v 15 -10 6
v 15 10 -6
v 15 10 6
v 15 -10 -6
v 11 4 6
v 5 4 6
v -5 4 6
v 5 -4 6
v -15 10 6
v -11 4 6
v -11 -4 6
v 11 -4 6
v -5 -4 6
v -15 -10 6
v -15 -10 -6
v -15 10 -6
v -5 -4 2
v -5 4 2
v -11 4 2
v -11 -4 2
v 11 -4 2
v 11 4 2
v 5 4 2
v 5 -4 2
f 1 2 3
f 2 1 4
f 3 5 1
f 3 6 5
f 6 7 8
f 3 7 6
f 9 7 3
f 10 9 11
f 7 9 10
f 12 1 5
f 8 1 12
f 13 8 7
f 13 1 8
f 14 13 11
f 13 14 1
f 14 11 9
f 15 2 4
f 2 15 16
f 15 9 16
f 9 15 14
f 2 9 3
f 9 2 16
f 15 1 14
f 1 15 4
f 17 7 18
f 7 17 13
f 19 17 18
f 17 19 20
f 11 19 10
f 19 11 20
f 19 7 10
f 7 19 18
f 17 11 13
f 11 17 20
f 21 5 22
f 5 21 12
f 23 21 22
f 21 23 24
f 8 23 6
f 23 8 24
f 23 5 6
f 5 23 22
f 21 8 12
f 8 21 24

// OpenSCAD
// Auto-generated from tests/data/feature_fixtures_manifest.json
// fixture: box_two_cutouts
// fixture_type: box
// description: Box with two symmetrically placed top-open rectangular notches. Tests multi-pocket counting.
$fn = 96;

box_size = [30.000000, 20.000000, 12.000000];
box_origin = [-15.000000, -10.000000, -6.000000];

module through_hole_x(center, diameter, length) {
  translate([box_origin[0] - 0.1, center[1], center[2]])
    rotate(a=90, v=[0, 1, 0]) cylinder(d=diameter, h=length, center=false);
}

module through_hole_y(center, diameter, length) {
  translate([center[0], box_origin[1] - 0.1, center[2]])
    rotate(a=90, v=[-1, 0, 0]) cylinder(d=diameter, h=length, center=false);
}

module through_hole_z(center, diameter, length) {
  translate([center[0], center[1], box_origin[2] - 0.1])
    cylinder(d=diameter, h=length, center=false);
}

difference() {
  translate(box_origin) cube(box_size);
  translate([-11.000000, -4.000000, 2.000000]) cube([6.000000, 8.000000, 4.000000]);  // cutout_0
  translate([5.000000, -4.000000, 2.000000]) cube([6.000000, 8.000000, 4.000000]);  // cutout_1
}
